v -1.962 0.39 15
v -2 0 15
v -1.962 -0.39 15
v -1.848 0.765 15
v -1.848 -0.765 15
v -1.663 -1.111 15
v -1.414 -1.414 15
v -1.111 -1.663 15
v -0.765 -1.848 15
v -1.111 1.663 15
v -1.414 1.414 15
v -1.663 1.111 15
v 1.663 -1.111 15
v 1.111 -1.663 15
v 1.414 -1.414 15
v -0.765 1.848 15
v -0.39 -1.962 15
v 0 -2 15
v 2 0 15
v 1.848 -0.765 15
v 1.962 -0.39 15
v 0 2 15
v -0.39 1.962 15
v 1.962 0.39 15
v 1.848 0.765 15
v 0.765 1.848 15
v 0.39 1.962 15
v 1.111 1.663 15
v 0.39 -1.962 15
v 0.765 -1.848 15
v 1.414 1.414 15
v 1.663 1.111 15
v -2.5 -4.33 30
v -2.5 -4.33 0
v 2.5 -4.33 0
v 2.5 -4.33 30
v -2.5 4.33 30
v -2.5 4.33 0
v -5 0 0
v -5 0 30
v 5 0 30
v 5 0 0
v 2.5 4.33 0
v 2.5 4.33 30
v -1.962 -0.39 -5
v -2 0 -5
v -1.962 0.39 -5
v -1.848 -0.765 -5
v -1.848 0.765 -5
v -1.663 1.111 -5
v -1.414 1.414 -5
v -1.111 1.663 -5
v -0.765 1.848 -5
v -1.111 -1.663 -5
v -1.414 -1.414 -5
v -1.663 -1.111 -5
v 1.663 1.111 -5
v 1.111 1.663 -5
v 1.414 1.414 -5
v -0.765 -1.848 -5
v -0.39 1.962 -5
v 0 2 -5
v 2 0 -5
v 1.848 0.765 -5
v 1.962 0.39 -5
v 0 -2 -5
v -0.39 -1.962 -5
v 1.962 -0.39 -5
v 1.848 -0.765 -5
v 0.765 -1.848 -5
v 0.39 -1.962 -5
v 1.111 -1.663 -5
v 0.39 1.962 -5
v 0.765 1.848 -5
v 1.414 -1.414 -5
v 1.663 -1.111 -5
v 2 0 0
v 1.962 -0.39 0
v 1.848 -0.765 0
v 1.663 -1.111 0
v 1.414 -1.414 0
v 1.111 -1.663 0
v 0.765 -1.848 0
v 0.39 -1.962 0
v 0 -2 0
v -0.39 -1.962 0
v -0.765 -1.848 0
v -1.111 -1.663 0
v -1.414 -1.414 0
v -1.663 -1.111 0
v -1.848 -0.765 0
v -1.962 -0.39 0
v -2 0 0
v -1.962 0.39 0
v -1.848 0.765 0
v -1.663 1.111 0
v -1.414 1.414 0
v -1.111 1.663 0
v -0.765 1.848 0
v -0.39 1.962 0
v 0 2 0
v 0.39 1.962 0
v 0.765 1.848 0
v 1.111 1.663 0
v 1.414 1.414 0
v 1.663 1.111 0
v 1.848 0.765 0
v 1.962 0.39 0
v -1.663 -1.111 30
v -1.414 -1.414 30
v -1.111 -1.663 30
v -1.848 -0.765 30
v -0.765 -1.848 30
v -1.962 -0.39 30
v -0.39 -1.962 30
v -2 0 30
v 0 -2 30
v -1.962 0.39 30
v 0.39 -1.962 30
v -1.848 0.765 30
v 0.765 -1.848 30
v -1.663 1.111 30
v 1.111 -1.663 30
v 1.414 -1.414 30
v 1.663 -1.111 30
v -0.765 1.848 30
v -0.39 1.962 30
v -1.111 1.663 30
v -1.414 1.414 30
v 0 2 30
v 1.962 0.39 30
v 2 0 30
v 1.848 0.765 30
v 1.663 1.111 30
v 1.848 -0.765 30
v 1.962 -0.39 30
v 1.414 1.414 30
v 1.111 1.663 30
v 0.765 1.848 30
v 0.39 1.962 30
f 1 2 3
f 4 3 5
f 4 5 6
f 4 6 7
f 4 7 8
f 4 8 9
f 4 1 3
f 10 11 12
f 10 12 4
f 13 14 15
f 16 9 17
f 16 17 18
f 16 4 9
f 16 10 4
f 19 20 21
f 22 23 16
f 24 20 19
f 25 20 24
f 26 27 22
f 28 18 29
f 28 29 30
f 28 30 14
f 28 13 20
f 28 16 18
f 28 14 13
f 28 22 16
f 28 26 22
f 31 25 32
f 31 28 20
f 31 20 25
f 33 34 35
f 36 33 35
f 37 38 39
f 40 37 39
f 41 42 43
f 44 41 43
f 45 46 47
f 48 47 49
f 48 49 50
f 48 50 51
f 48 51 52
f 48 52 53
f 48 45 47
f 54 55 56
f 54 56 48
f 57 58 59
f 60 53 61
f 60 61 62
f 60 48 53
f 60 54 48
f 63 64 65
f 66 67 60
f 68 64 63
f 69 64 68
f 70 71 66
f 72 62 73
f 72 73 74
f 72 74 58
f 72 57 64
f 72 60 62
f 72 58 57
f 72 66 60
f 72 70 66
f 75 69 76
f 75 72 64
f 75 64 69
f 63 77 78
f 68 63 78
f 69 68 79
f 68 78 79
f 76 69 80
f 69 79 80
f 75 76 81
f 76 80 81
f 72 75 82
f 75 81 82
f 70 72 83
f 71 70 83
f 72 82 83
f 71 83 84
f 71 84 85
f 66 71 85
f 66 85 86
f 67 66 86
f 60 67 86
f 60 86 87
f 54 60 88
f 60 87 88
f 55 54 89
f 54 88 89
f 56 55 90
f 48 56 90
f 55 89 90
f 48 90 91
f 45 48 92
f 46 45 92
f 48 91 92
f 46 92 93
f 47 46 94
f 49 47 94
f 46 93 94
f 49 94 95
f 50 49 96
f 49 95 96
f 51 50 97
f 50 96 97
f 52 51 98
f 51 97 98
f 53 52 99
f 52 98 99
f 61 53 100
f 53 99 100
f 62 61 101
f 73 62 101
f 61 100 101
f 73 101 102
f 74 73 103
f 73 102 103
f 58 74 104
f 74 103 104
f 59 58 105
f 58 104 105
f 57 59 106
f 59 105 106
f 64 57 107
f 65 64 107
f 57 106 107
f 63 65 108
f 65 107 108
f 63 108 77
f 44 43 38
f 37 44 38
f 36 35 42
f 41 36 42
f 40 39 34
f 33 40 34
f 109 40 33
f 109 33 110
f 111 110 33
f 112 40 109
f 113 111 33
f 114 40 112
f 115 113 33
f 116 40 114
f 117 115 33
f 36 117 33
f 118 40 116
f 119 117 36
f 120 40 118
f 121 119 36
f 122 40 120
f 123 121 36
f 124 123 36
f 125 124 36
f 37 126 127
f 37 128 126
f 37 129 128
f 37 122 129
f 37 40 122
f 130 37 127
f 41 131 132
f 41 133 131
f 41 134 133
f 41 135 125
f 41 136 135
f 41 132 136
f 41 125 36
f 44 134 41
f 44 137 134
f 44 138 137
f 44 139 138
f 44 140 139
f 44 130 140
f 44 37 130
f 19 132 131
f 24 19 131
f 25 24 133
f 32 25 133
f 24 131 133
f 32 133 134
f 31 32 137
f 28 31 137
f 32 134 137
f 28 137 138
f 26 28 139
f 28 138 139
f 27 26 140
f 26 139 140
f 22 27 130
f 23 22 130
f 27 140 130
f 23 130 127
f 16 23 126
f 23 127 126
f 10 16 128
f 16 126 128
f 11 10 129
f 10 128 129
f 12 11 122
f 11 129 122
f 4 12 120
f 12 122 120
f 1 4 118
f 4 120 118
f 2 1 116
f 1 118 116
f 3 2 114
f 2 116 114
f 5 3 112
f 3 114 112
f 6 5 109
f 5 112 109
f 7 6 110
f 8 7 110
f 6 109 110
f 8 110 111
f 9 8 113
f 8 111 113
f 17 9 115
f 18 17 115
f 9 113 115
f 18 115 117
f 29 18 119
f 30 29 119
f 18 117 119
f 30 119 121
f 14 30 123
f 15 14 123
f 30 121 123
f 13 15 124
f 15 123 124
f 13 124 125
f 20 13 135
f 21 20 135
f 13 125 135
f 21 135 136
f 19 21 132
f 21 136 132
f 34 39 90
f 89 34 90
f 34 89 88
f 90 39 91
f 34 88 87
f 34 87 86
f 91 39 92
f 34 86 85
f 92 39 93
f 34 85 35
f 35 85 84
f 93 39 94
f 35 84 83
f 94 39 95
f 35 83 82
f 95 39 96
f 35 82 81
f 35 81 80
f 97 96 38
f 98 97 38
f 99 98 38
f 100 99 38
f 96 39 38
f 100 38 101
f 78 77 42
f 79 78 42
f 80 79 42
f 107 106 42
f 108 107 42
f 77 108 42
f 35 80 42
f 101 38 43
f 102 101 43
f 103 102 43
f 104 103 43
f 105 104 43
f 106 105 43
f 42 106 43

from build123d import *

# Parameters (mm, degrees)
EXTRUDE002_DEPTH = 30
SKETCH010_R      = 2
POCKET002_DEPTH  = 15
SKETCH011_R      = 2
EXTRUDE004_DEPTH = 5


with BuildPart() as pocket002:
    # Sketch008 → Extrude002 (new body)
    with BuildSketch(Plane.XY):
        Polygon((5, 0), (2.5, 4.330127), (-2.5, 4.330127), (-5, 0), (-2.5, -4.330127), (2.5, -4.330127), align=None)
    extrude(amount=EXTRUDE002_DEPTH)

    # Sketch010 → Pocket002 (cut)
    with BuildSketch(Plane.XY.offset(30)):
        Circle(SKETCH010_R)
    extrude(amount=-POCKET002_DEPTH, mode=Mode.SUBTRACT)


with BuildPart() as stendoffmodel:
    # Sketch011 → Extrude004 (new body)
    with BuildSketch(Plane(origin=(0, 0, 0), x_dir=(1, 0, 0), z_dir=(0, 0, -1))):
        Circle(SKETCH011_R)
    extrude(amount=EXTRUDE004_DEPTH)

    # Fusion: union Pocket002
    add(pocket002.part)


solid = stendoffmodel.part
